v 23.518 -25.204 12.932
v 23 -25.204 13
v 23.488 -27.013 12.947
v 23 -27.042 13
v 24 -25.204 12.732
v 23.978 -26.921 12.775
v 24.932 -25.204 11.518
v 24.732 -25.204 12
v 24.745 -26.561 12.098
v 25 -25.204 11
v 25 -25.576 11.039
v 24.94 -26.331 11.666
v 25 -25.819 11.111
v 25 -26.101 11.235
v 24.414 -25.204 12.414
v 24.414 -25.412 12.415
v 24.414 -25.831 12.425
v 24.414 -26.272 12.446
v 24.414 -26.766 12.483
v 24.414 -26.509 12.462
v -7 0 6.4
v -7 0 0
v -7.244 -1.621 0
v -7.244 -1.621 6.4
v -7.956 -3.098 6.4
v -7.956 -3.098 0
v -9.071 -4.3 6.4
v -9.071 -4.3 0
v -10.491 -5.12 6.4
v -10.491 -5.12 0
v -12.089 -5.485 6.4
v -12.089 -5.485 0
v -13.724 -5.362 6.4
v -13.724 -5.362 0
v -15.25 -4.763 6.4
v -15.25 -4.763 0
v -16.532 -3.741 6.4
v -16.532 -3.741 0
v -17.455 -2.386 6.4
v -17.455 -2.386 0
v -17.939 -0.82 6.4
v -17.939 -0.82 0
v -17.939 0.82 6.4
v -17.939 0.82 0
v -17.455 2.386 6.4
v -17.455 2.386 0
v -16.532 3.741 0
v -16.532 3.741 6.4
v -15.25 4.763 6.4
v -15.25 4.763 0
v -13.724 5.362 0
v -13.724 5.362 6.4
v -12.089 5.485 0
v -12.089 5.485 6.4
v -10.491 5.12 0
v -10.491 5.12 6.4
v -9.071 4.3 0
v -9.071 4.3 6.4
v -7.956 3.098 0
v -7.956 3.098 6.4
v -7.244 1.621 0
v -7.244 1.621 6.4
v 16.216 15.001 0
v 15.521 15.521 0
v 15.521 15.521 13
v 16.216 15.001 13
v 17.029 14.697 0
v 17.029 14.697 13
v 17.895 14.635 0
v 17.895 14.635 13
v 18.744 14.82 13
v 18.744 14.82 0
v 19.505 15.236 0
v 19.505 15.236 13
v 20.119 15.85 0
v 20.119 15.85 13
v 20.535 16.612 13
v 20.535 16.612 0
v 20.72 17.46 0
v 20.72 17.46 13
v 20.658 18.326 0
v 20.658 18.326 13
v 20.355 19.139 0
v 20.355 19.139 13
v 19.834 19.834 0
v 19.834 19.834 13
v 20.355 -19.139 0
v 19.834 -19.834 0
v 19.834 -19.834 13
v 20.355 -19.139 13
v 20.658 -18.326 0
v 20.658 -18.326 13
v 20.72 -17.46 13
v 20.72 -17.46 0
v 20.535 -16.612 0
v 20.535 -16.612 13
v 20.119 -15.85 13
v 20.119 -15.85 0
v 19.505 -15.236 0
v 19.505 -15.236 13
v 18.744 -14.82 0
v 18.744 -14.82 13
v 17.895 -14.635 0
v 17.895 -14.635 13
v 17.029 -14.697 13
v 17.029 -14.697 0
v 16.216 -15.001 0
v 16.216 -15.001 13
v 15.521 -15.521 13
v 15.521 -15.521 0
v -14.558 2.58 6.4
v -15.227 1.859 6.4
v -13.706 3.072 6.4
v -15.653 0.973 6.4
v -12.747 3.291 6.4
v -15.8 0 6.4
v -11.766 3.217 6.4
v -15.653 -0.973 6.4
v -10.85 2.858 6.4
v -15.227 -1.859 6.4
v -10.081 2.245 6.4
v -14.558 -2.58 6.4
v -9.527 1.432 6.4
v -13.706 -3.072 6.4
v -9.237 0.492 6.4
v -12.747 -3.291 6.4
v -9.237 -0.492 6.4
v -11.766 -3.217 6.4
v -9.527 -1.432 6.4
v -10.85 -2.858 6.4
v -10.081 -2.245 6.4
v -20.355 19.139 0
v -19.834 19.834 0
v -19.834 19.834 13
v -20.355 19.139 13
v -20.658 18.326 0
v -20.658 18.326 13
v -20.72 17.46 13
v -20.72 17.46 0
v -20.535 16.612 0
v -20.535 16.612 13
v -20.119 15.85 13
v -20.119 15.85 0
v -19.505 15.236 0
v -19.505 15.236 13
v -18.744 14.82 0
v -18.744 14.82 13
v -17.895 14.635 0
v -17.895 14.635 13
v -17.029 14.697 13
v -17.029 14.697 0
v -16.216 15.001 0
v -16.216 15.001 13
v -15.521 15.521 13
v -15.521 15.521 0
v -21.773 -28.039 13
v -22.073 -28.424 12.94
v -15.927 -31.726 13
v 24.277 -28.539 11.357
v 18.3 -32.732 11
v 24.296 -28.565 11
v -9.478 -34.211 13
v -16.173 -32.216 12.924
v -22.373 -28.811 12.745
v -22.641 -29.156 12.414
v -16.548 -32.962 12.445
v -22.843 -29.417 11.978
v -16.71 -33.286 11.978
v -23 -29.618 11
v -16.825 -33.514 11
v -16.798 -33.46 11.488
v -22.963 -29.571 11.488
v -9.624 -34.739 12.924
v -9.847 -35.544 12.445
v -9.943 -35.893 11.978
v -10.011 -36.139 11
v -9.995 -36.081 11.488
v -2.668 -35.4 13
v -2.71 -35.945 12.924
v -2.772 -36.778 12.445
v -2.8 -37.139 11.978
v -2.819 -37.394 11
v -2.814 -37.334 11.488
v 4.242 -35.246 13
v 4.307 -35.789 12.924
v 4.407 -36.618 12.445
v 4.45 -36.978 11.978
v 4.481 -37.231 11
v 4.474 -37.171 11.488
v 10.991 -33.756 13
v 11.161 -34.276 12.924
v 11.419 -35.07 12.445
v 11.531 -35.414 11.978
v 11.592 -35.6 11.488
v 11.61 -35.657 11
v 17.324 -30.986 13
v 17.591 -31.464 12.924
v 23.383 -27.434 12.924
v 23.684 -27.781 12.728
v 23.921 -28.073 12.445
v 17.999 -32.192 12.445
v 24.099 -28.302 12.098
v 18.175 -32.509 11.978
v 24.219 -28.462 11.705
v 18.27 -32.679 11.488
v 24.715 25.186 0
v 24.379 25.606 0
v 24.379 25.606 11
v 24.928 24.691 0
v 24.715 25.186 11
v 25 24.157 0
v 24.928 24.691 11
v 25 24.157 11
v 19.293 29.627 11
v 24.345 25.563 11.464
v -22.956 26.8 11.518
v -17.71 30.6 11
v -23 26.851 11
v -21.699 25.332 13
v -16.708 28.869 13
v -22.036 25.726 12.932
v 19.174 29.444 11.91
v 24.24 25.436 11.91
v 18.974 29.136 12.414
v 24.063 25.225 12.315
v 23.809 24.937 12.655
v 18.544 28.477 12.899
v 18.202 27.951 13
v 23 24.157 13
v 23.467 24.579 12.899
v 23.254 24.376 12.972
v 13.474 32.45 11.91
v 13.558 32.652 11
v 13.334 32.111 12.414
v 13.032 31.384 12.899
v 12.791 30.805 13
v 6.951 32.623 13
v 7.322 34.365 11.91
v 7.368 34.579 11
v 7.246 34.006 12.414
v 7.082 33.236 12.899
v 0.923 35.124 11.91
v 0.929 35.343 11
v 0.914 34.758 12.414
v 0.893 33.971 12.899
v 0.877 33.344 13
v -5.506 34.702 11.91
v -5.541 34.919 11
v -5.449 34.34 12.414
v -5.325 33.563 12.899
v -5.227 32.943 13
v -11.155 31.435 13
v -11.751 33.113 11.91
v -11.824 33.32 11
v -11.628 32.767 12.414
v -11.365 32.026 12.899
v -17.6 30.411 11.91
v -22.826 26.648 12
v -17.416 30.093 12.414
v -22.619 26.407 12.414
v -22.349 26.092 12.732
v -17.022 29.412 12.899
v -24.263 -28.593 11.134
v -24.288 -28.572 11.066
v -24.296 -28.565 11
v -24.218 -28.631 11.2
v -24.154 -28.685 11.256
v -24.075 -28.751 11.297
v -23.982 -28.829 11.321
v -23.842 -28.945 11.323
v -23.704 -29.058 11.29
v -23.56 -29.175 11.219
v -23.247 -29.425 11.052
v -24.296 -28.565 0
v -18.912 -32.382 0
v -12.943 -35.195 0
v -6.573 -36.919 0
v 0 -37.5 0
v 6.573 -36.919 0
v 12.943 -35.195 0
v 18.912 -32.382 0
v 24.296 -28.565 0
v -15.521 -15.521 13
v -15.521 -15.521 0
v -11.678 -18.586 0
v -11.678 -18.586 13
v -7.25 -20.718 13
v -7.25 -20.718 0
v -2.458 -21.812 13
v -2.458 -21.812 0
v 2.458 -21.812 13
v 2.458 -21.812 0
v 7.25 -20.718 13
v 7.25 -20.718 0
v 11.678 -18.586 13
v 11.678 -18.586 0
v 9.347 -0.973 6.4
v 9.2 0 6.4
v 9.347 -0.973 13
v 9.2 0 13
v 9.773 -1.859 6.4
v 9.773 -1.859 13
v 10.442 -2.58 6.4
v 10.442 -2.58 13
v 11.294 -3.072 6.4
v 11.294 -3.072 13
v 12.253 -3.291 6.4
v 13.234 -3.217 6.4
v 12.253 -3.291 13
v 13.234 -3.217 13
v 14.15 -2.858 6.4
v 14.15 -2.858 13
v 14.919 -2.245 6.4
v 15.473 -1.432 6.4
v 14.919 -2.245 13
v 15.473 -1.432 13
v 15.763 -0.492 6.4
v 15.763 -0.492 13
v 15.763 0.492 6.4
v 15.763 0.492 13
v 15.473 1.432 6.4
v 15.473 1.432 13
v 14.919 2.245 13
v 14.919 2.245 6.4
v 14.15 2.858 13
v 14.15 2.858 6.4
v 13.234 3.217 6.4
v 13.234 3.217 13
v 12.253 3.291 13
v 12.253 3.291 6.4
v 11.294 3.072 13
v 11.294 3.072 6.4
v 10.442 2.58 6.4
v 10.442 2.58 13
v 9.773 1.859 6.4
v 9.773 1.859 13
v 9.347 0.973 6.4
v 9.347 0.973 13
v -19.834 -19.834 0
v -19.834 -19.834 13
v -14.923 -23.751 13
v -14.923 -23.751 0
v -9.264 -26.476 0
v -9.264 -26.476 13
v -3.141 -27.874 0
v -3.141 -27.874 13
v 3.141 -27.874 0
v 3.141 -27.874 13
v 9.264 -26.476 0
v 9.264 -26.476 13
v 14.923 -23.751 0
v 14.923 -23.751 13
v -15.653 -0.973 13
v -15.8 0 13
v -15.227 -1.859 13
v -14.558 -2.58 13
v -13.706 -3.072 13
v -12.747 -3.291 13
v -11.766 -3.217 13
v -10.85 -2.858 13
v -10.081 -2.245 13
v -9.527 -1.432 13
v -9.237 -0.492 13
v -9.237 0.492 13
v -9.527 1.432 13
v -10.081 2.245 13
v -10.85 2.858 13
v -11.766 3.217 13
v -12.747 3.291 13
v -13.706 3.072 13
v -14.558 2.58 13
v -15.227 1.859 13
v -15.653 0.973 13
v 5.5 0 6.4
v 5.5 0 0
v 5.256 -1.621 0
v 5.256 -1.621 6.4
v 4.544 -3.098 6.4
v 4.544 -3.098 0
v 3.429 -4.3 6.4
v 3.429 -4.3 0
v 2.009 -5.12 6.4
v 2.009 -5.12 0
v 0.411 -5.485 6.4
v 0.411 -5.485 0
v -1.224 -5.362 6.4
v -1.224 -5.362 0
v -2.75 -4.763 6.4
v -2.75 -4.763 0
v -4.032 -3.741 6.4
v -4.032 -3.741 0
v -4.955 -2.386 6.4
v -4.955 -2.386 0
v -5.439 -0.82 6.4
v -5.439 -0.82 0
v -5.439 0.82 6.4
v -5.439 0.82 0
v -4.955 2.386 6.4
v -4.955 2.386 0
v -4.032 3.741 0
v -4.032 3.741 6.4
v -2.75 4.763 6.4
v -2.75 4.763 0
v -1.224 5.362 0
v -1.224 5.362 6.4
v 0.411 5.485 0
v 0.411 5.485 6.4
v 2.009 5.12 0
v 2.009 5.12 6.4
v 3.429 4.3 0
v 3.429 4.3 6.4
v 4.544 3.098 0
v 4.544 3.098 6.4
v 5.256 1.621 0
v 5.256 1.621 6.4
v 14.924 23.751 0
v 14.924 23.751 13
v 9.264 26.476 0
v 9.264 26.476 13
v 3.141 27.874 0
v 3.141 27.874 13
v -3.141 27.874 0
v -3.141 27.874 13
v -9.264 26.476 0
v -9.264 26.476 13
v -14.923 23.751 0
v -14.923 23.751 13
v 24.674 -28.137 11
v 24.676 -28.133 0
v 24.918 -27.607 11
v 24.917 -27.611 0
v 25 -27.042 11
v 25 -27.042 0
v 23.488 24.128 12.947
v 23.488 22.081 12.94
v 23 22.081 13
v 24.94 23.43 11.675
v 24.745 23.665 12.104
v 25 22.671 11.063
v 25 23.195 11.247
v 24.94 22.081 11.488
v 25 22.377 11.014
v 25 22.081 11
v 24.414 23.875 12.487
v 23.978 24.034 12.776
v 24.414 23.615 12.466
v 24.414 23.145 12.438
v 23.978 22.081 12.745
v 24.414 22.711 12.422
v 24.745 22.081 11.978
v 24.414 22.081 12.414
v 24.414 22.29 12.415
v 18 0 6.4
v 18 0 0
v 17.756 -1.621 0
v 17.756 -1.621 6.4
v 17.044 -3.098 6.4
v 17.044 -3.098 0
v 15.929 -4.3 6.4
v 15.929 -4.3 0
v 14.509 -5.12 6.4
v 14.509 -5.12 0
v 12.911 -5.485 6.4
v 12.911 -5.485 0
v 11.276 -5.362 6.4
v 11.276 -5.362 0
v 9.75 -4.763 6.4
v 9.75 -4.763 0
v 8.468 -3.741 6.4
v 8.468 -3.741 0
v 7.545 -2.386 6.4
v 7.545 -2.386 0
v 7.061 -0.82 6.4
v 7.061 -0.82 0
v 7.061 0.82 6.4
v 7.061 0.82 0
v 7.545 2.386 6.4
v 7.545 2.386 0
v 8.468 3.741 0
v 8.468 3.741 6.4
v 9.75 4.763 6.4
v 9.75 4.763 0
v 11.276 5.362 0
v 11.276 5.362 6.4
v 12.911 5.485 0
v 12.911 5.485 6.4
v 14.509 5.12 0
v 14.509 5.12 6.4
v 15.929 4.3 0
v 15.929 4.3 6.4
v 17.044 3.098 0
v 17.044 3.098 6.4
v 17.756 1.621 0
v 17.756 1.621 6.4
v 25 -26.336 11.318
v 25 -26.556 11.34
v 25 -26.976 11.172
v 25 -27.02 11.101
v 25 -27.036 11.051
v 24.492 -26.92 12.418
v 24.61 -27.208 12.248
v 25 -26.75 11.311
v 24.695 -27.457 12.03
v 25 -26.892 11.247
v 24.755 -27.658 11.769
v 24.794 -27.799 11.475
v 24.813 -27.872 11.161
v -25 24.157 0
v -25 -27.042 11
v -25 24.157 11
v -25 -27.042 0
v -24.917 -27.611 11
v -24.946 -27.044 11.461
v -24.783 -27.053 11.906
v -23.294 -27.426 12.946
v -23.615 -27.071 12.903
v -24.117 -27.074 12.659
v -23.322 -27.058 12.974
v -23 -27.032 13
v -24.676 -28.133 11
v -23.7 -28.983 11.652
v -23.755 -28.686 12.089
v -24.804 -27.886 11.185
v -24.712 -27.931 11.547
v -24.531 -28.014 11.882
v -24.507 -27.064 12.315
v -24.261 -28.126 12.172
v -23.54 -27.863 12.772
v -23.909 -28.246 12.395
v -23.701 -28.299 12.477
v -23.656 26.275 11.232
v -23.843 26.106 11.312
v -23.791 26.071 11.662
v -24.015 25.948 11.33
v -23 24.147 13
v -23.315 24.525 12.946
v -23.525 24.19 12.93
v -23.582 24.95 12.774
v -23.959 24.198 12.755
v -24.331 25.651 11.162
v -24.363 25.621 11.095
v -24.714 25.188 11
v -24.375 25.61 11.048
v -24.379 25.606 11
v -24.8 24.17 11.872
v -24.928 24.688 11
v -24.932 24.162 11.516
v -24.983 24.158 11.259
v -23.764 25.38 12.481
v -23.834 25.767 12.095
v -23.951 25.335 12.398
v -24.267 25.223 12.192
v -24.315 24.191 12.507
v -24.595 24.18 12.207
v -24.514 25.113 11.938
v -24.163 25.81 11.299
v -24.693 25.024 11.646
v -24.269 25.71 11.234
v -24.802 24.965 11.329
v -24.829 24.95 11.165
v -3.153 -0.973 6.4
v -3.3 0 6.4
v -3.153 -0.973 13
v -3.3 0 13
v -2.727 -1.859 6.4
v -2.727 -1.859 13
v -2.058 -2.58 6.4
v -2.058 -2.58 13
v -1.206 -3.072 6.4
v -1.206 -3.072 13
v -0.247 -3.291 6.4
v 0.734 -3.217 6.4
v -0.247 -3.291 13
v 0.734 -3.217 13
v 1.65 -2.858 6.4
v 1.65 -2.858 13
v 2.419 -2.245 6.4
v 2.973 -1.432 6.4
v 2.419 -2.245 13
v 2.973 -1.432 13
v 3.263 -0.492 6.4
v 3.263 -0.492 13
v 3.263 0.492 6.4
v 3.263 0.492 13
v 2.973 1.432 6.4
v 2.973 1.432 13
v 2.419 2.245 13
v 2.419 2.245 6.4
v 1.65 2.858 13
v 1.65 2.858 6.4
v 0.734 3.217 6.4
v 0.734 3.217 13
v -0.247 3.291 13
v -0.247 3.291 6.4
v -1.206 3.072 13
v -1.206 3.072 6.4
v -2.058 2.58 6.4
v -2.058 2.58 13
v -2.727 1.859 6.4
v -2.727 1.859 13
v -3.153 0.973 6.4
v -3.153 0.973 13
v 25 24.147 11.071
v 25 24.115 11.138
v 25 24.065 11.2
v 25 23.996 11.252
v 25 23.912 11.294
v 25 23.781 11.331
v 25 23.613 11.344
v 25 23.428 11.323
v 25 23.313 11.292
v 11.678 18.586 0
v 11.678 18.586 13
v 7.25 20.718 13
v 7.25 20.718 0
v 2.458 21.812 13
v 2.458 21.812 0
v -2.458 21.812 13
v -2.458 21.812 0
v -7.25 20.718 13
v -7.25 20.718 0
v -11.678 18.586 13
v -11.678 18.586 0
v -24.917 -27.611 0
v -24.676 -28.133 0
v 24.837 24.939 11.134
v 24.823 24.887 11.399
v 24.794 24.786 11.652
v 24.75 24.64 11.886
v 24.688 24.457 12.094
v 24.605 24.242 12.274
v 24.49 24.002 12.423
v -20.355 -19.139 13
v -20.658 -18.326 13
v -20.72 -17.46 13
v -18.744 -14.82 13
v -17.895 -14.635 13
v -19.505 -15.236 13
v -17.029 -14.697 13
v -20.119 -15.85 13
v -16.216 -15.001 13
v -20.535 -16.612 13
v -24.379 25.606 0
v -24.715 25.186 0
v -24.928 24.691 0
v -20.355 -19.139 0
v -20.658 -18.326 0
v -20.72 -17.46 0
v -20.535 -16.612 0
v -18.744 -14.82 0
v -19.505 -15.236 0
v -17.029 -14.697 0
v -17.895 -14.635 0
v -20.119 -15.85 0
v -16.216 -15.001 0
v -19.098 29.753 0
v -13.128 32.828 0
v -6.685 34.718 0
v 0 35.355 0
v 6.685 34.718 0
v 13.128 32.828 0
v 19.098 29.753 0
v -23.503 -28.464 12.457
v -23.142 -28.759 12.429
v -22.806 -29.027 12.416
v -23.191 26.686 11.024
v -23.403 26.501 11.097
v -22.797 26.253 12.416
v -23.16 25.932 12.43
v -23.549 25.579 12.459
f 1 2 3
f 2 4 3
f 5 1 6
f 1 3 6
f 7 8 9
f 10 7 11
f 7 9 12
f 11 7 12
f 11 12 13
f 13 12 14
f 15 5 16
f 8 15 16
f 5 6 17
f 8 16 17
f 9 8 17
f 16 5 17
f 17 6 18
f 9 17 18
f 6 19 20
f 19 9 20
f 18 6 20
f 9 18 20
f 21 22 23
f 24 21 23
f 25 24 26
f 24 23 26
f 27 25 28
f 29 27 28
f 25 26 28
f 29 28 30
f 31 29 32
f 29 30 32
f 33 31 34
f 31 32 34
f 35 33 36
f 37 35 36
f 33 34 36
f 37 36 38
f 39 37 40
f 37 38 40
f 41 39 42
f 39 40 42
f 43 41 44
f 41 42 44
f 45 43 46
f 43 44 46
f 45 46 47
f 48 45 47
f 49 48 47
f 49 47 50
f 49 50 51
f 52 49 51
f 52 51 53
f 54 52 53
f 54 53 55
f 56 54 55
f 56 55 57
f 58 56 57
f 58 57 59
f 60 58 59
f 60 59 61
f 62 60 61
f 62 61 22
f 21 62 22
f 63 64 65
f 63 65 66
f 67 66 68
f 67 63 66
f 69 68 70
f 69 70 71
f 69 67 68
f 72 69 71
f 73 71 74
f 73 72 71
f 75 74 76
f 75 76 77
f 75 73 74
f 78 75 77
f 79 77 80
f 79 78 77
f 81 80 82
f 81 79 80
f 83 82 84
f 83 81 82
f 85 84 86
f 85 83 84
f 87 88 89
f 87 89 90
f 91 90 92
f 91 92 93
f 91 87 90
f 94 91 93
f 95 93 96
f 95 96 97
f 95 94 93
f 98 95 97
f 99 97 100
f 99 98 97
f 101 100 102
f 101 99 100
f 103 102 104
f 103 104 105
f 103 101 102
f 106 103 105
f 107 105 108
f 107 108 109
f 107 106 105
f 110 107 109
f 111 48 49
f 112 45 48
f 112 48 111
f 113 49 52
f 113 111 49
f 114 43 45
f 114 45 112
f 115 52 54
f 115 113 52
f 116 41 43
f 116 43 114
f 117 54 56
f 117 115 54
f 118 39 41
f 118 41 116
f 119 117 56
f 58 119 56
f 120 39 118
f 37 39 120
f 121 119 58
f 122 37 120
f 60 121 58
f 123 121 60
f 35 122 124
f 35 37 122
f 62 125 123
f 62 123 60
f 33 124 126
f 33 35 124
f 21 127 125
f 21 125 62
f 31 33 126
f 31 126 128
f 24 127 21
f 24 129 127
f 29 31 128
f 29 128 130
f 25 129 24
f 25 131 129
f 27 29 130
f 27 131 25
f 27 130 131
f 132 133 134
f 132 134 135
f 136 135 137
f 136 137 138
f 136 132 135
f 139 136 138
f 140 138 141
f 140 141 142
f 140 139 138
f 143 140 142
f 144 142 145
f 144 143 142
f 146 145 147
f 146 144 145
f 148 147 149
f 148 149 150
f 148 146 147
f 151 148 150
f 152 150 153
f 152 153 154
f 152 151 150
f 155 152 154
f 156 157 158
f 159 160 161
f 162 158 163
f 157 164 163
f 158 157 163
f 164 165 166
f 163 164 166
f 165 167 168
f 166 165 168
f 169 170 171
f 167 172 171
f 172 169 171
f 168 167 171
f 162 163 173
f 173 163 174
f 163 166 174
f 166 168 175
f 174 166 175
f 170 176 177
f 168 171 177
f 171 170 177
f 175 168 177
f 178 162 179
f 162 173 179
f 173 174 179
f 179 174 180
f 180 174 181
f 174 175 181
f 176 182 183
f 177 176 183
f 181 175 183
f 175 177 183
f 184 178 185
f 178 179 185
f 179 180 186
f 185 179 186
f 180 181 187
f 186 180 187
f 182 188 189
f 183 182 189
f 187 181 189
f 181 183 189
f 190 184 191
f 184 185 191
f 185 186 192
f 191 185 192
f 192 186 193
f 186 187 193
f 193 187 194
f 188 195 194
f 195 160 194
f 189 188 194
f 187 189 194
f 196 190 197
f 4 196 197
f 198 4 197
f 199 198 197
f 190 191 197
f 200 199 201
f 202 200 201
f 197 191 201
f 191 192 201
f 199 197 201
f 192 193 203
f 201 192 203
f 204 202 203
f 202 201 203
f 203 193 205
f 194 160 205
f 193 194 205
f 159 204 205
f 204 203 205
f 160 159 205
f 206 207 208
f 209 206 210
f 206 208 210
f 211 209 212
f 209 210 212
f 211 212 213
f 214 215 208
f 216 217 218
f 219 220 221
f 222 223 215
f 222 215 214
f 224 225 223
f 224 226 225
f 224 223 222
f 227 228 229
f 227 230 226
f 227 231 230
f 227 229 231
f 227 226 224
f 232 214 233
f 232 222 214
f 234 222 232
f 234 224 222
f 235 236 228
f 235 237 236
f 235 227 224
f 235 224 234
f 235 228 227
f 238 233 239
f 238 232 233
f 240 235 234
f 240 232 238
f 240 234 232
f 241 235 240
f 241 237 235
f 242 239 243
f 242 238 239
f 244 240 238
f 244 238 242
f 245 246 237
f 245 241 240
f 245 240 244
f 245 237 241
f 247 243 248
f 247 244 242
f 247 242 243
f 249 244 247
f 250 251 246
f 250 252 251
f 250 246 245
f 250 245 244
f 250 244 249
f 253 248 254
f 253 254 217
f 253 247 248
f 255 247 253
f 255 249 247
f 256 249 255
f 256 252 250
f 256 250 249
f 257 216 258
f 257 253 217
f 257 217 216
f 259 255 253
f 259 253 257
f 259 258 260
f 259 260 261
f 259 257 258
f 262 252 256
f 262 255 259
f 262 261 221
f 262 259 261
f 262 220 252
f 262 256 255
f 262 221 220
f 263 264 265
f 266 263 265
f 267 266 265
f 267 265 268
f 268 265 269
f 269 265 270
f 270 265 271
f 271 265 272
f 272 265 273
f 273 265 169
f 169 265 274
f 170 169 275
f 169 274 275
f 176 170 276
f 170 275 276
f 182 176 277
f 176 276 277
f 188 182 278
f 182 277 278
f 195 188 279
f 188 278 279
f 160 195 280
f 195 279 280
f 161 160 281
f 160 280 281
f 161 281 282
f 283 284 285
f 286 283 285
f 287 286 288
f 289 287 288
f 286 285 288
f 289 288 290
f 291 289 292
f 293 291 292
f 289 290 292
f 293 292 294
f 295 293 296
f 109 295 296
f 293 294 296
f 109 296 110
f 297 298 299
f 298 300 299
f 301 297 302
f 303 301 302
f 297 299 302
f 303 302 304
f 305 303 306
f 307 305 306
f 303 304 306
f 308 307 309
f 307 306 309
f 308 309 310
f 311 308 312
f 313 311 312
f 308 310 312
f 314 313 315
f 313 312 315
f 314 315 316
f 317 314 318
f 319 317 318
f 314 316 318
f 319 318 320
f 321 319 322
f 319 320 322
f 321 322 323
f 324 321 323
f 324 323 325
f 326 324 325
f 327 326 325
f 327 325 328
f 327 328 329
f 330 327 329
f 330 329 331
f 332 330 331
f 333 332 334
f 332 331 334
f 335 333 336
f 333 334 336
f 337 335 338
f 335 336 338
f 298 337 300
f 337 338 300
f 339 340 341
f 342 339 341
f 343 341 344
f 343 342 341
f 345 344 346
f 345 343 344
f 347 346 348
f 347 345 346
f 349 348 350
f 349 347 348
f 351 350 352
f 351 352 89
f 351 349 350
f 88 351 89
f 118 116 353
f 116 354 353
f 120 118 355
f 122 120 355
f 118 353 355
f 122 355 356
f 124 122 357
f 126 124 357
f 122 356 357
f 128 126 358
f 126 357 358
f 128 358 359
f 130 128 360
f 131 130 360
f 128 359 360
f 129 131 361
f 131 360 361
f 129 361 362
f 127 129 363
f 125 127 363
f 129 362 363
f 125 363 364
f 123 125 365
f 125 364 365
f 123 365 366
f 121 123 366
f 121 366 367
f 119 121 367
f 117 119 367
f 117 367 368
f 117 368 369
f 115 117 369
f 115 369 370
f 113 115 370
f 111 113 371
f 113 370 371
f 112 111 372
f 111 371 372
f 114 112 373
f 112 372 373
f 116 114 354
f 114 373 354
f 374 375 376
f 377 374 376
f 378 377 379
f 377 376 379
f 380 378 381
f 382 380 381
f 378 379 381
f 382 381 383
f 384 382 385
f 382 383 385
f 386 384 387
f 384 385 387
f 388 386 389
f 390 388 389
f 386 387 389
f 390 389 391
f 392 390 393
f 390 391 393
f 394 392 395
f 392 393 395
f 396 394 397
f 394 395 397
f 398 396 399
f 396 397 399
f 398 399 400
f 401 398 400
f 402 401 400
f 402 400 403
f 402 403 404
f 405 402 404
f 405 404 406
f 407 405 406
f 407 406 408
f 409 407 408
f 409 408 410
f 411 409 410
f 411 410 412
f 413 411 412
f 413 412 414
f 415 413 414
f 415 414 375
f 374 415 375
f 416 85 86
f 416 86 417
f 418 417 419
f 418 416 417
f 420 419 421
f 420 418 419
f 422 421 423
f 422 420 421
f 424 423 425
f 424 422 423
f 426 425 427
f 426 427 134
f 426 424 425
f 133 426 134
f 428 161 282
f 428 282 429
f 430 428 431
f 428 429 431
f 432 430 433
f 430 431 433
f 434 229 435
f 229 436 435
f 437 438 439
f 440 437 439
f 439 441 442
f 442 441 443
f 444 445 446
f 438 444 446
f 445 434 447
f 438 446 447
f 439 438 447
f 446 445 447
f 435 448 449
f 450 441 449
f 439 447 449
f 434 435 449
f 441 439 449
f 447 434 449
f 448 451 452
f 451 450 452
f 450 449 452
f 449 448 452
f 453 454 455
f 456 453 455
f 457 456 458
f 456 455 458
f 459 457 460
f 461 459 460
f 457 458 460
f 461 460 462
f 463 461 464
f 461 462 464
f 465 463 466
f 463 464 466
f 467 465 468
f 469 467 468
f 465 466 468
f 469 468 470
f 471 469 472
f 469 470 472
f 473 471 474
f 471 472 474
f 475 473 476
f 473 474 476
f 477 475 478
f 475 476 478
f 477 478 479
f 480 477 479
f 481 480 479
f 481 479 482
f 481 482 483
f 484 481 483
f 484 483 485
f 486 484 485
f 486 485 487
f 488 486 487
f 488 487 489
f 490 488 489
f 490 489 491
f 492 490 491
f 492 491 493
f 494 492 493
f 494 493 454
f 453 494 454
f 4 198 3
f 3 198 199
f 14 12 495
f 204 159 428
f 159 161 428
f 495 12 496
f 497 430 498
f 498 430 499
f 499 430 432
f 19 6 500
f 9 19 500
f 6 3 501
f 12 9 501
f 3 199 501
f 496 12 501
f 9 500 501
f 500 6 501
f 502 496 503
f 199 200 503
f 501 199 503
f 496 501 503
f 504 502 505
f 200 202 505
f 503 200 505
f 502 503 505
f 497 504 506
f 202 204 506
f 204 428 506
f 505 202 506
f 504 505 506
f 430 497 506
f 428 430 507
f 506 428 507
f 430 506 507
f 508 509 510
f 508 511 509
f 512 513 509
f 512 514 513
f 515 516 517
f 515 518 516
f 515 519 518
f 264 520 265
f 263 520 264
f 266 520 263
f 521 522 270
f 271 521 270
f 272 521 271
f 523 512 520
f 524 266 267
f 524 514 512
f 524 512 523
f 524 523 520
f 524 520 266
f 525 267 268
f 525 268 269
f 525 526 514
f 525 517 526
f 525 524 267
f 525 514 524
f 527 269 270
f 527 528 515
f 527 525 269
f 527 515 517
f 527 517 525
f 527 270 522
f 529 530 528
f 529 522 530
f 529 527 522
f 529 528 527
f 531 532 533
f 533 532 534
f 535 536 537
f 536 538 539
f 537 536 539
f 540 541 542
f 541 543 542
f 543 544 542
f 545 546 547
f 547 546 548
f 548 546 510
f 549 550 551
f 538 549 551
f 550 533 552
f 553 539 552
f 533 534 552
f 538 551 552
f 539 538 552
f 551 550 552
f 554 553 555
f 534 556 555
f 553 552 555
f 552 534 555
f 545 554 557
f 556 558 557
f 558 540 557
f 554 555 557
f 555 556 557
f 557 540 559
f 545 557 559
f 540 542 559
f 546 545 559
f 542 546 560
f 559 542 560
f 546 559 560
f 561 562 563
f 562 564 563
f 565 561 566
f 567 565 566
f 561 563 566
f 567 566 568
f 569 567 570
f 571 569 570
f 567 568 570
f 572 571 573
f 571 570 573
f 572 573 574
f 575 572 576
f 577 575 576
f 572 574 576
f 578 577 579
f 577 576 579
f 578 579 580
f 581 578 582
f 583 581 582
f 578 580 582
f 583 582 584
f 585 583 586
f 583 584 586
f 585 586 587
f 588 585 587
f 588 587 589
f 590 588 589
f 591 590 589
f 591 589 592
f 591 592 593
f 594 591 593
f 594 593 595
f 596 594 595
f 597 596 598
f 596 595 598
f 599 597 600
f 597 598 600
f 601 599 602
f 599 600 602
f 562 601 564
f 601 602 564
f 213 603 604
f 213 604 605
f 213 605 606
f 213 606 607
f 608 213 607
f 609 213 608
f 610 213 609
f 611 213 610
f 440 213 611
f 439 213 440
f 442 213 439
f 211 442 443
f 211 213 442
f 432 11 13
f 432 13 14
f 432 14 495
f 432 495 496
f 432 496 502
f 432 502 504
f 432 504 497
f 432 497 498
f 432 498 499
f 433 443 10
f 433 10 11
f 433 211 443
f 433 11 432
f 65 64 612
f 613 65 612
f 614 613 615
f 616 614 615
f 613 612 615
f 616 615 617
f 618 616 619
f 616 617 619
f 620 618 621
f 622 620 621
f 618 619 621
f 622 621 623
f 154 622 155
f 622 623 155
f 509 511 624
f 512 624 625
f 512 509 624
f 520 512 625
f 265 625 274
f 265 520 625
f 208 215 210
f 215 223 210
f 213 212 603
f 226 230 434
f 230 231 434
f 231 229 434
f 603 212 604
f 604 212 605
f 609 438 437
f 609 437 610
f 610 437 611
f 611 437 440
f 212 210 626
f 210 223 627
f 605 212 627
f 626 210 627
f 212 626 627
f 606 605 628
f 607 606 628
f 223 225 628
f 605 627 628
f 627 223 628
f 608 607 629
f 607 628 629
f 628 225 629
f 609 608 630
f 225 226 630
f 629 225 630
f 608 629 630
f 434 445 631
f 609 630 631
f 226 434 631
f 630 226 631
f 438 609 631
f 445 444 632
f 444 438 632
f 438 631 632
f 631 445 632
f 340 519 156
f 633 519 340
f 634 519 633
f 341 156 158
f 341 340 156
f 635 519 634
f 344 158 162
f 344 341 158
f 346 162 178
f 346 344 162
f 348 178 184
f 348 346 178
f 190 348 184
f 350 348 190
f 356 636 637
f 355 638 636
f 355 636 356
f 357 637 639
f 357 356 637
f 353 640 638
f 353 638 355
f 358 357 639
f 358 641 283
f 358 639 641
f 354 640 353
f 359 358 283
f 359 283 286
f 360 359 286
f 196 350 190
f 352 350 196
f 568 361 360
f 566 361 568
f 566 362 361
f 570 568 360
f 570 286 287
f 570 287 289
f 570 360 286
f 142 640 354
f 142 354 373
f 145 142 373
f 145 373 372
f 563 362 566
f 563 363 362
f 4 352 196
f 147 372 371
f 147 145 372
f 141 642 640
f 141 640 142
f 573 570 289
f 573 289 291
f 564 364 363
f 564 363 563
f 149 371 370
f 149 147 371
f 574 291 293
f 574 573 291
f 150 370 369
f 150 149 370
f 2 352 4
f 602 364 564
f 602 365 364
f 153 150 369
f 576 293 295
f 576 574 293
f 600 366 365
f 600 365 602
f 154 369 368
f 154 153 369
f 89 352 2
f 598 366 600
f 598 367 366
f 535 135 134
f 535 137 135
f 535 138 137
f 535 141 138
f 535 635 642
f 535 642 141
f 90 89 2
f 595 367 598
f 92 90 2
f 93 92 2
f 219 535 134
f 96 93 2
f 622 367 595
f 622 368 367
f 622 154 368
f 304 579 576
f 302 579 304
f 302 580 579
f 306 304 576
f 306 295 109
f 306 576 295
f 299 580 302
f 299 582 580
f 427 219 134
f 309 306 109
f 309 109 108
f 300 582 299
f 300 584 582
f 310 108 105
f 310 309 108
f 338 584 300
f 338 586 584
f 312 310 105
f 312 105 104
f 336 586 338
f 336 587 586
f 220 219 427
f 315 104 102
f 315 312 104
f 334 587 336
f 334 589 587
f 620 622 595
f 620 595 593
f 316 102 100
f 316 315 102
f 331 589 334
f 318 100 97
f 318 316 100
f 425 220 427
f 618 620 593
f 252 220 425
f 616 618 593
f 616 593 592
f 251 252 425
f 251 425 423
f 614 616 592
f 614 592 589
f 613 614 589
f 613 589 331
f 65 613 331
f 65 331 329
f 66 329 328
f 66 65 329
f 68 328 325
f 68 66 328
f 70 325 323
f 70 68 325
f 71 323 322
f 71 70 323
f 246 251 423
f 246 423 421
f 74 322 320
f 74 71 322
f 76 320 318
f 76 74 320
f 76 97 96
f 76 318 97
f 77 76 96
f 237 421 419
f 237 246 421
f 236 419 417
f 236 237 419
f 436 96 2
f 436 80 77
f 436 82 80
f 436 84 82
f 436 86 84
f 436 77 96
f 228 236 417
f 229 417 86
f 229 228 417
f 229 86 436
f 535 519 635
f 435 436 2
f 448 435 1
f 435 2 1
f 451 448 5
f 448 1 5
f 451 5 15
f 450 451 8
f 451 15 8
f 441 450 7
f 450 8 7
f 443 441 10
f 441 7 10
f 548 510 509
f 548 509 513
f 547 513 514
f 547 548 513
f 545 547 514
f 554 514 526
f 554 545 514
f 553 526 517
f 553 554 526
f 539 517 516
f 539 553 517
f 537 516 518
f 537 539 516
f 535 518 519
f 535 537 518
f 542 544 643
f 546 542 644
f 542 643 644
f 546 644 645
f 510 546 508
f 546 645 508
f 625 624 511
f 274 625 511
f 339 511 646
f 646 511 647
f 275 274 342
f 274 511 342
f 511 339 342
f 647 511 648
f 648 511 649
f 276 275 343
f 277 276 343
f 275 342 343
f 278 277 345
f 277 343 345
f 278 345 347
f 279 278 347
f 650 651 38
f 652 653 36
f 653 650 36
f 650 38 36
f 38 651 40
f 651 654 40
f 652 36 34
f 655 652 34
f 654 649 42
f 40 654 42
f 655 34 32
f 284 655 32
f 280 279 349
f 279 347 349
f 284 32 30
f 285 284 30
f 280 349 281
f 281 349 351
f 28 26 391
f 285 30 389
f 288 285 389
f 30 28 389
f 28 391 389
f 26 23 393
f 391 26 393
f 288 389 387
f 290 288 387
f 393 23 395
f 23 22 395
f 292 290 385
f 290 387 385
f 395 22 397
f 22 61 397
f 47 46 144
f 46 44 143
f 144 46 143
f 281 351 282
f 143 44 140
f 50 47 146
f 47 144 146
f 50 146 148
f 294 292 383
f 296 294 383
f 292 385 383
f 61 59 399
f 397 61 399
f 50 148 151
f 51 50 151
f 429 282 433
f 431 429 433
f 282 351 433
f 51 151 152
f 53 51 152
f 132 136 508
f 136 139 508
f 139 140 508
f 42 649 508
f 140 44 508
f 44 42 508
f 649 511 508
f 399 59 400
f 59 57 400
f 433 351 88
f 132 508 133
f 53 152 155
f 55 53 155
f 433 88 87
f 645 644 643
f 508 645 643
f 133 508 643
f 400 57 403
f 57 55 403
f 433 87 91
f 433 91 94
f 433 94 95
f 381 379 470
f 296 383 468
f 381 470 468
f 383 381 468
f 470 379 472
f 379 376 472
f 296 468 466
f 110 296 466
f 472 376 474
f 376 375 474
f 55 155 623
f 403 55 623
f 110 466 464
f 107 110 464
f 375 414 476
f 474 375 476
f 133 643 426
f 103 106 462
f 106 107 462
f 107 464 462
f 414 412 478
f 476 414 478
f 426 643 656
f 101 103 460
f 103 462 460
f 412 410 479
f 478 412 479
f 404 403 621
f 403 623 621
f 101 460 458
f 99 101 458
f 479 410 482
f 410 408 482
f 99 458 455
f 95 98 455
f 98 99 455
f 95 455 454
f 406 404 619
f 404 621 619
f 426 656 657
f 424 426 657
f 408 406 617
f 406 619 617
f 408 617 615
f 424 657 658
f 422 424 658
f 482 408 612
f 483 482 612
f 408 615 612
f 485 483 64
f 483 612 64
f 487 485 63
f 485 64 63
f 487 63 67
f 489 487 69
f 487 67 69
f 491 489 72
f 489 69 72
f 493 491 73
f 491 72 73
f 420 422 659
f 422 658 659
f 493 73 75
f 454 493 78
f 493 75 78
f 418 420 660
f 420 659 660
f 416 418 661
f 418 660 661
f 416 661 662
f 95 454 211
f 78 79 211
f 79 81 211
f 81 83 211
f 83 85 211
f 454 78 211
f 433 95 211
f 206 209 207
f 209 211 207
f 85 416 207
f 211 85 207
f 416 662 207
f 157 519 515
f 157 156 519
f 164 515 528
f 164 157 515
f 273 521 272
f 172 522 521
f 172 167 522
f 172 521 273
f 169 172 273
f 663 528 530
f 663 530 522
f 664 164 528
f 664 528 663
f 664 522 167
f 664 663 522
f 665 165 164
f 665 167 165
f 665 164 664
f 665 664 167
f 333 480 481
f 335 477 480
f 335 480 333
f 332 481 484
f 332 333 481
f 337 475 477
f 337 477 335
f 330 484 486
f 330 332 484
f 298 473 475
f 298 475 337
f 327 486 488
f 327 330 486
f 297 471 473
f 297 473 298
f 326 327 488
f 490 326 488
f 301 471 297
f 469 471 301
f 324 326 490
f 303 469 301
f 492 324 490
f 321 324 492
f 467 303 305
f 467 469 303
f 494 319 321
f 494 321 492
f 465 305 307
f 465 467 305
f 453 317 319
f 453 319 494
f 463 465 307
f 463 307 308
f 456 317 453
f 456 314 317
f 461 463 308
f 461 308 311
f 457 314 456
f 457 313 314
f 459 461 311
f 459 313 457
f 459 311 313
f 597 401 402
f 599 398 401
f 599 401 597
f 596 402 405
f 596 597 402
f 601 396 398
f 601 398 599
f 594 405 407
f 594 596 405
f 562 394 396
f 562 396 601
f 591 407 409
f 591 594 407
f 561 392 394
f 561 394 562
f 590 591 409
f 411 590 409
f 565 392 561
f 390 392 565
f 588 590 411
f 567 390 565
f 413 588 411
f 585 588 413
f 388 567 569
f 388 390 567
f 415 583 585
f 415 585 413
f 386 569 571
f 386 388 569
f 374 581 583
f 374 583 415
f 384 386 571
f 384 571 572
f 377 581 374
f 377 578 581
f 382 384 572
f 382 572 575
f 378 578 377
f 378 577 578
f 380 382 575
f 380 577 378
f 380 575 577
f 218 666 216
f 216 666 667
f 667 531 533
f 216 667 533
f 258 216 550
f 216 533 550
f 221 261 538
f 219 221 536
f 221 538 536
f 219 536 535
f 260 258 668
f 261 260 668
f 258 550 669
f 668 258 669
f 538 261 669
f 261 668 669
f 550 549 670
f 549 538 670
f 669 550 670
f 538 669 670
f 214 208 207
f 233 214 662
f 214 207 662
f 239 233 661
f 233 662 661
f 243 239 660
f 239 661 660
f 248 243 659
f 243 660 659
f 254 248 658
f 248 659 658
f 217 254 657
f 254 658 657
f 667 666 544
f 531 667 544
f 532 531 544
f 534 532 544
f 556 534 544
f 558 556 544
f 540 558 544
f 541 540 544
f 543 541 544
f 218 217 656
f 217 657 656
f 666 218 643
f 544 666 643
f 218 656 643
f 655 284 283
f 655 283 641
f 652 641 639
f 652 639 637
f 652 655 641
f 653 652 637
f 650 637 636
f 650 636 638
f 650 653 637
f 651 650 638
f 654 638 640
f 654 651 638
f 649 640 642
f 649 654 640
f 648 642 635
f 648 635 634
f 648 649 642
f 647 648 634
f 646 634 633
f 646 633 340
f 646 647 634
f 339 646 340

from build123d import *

# Parameters (mm, degrees)
PAD_DEPTH        = 13
HOLE_D           = 6.6
HOLE_DEPTH       = 25
HOLE_CBORE_D     = 11
HOLE_CBORE_DEPTH = 6.4
FILLET_R         = 2
FILLET001_R      = 2
FILLET002_R      = 2
FILLET003_R      = 2


with BuildPart() as part:
    # Sketch → Pad (new body)
    with BuildSketch(Plane.XY):
        with BuildLine():
            ThreePointArc((25, 25), (0, 35.355339), (-25, 25))
            Line((-25, -27.95085), (-25, 25))
            ThreePointArc((-25, -27.95085), (0, -37.5), (25, -27.95085))
            Line((25, 25), (25, -27.95085))
        make_face()
        with BuildLine():
            ThreePointArc((-19.834345, -19.834345), (0, -28.05), (19.834345, -19.834345))
            ThreePointArc((19.834345, -19.834345), (19.834345, -15.520994), (15.520994, -15.520994))
            ThreePointArc((-15.520994, -15.520994), (0, -21.95), (15.520994, -15.520994))
            ThreePointArc((-15.520994, -15.520994), (-19.834345, -15.520994), (-19.834345, -19.834345))
        make_face(mode=Mode.SUBTRACT)
        with BuildLine():
            ThreePointArc((-19.834345, 19.834345), (-19.834345, 15.520994), (-15.520994, 15.520994))
            ThreePointArc((15.521007, 15.52098), (1e-05, 21.95), (-15.520994, 15.520994))
            ThreePointArc((15.521007, 15.52098), (19.834352, 15.521), (19.834346, 19.834345))
            ThreePointArc((19.834346, 19.834345), (0, 28.05), (-19.834345, 19.834345))
        make_face(mode=Mode.SUBTRACT)
    extrude(amount=PAD_DEPTH)

    # Hole
    with Locations(Plane(origin=(0, 0, 0), x_dir=(1, 0, 0), z_dir=(0, 0, -1))):
        with Locations((0, 0), (-12.5, 0), (12.5, 0)):
            CounterBoreHole(HOLE_D / 2, HOLE_CBORE_D / 2, HOLE_CBORE_DEPTH, depth=HOLE_DEPTH)

    # Fillet
    fillet_edges = [part.edges().sort_by_distance(p)[0] for p in [
        (-25, -1.475425, 13),
    ]]
    fillet(fillet_edges, radius=FILLET_R)

    # Fillet001
    fillet001_edges = [part.edges().sort_by_distance(p)[0] for p in [
        (1.301993, -37.477391, 13),
    ]]
    fillet(fillet001_edges, radius=FILLET001_R)

    # Fillet002
    fillet002_edges = [part.edges().sort_by_distance(p)[0] for p in [
        (1.362703, 35.329068, 13),
    ]]
    fillet(fillet002_edges, radius=FILLET002_R)

    # Fillet003
    fillet003_edges = [part.edges().sort_by_distance(p)[0] for p in [
        (25, -1.561492, 13),
    ]]
    fillet(fillet003_edges, radius=FILLET003_R)


solid = part.part
